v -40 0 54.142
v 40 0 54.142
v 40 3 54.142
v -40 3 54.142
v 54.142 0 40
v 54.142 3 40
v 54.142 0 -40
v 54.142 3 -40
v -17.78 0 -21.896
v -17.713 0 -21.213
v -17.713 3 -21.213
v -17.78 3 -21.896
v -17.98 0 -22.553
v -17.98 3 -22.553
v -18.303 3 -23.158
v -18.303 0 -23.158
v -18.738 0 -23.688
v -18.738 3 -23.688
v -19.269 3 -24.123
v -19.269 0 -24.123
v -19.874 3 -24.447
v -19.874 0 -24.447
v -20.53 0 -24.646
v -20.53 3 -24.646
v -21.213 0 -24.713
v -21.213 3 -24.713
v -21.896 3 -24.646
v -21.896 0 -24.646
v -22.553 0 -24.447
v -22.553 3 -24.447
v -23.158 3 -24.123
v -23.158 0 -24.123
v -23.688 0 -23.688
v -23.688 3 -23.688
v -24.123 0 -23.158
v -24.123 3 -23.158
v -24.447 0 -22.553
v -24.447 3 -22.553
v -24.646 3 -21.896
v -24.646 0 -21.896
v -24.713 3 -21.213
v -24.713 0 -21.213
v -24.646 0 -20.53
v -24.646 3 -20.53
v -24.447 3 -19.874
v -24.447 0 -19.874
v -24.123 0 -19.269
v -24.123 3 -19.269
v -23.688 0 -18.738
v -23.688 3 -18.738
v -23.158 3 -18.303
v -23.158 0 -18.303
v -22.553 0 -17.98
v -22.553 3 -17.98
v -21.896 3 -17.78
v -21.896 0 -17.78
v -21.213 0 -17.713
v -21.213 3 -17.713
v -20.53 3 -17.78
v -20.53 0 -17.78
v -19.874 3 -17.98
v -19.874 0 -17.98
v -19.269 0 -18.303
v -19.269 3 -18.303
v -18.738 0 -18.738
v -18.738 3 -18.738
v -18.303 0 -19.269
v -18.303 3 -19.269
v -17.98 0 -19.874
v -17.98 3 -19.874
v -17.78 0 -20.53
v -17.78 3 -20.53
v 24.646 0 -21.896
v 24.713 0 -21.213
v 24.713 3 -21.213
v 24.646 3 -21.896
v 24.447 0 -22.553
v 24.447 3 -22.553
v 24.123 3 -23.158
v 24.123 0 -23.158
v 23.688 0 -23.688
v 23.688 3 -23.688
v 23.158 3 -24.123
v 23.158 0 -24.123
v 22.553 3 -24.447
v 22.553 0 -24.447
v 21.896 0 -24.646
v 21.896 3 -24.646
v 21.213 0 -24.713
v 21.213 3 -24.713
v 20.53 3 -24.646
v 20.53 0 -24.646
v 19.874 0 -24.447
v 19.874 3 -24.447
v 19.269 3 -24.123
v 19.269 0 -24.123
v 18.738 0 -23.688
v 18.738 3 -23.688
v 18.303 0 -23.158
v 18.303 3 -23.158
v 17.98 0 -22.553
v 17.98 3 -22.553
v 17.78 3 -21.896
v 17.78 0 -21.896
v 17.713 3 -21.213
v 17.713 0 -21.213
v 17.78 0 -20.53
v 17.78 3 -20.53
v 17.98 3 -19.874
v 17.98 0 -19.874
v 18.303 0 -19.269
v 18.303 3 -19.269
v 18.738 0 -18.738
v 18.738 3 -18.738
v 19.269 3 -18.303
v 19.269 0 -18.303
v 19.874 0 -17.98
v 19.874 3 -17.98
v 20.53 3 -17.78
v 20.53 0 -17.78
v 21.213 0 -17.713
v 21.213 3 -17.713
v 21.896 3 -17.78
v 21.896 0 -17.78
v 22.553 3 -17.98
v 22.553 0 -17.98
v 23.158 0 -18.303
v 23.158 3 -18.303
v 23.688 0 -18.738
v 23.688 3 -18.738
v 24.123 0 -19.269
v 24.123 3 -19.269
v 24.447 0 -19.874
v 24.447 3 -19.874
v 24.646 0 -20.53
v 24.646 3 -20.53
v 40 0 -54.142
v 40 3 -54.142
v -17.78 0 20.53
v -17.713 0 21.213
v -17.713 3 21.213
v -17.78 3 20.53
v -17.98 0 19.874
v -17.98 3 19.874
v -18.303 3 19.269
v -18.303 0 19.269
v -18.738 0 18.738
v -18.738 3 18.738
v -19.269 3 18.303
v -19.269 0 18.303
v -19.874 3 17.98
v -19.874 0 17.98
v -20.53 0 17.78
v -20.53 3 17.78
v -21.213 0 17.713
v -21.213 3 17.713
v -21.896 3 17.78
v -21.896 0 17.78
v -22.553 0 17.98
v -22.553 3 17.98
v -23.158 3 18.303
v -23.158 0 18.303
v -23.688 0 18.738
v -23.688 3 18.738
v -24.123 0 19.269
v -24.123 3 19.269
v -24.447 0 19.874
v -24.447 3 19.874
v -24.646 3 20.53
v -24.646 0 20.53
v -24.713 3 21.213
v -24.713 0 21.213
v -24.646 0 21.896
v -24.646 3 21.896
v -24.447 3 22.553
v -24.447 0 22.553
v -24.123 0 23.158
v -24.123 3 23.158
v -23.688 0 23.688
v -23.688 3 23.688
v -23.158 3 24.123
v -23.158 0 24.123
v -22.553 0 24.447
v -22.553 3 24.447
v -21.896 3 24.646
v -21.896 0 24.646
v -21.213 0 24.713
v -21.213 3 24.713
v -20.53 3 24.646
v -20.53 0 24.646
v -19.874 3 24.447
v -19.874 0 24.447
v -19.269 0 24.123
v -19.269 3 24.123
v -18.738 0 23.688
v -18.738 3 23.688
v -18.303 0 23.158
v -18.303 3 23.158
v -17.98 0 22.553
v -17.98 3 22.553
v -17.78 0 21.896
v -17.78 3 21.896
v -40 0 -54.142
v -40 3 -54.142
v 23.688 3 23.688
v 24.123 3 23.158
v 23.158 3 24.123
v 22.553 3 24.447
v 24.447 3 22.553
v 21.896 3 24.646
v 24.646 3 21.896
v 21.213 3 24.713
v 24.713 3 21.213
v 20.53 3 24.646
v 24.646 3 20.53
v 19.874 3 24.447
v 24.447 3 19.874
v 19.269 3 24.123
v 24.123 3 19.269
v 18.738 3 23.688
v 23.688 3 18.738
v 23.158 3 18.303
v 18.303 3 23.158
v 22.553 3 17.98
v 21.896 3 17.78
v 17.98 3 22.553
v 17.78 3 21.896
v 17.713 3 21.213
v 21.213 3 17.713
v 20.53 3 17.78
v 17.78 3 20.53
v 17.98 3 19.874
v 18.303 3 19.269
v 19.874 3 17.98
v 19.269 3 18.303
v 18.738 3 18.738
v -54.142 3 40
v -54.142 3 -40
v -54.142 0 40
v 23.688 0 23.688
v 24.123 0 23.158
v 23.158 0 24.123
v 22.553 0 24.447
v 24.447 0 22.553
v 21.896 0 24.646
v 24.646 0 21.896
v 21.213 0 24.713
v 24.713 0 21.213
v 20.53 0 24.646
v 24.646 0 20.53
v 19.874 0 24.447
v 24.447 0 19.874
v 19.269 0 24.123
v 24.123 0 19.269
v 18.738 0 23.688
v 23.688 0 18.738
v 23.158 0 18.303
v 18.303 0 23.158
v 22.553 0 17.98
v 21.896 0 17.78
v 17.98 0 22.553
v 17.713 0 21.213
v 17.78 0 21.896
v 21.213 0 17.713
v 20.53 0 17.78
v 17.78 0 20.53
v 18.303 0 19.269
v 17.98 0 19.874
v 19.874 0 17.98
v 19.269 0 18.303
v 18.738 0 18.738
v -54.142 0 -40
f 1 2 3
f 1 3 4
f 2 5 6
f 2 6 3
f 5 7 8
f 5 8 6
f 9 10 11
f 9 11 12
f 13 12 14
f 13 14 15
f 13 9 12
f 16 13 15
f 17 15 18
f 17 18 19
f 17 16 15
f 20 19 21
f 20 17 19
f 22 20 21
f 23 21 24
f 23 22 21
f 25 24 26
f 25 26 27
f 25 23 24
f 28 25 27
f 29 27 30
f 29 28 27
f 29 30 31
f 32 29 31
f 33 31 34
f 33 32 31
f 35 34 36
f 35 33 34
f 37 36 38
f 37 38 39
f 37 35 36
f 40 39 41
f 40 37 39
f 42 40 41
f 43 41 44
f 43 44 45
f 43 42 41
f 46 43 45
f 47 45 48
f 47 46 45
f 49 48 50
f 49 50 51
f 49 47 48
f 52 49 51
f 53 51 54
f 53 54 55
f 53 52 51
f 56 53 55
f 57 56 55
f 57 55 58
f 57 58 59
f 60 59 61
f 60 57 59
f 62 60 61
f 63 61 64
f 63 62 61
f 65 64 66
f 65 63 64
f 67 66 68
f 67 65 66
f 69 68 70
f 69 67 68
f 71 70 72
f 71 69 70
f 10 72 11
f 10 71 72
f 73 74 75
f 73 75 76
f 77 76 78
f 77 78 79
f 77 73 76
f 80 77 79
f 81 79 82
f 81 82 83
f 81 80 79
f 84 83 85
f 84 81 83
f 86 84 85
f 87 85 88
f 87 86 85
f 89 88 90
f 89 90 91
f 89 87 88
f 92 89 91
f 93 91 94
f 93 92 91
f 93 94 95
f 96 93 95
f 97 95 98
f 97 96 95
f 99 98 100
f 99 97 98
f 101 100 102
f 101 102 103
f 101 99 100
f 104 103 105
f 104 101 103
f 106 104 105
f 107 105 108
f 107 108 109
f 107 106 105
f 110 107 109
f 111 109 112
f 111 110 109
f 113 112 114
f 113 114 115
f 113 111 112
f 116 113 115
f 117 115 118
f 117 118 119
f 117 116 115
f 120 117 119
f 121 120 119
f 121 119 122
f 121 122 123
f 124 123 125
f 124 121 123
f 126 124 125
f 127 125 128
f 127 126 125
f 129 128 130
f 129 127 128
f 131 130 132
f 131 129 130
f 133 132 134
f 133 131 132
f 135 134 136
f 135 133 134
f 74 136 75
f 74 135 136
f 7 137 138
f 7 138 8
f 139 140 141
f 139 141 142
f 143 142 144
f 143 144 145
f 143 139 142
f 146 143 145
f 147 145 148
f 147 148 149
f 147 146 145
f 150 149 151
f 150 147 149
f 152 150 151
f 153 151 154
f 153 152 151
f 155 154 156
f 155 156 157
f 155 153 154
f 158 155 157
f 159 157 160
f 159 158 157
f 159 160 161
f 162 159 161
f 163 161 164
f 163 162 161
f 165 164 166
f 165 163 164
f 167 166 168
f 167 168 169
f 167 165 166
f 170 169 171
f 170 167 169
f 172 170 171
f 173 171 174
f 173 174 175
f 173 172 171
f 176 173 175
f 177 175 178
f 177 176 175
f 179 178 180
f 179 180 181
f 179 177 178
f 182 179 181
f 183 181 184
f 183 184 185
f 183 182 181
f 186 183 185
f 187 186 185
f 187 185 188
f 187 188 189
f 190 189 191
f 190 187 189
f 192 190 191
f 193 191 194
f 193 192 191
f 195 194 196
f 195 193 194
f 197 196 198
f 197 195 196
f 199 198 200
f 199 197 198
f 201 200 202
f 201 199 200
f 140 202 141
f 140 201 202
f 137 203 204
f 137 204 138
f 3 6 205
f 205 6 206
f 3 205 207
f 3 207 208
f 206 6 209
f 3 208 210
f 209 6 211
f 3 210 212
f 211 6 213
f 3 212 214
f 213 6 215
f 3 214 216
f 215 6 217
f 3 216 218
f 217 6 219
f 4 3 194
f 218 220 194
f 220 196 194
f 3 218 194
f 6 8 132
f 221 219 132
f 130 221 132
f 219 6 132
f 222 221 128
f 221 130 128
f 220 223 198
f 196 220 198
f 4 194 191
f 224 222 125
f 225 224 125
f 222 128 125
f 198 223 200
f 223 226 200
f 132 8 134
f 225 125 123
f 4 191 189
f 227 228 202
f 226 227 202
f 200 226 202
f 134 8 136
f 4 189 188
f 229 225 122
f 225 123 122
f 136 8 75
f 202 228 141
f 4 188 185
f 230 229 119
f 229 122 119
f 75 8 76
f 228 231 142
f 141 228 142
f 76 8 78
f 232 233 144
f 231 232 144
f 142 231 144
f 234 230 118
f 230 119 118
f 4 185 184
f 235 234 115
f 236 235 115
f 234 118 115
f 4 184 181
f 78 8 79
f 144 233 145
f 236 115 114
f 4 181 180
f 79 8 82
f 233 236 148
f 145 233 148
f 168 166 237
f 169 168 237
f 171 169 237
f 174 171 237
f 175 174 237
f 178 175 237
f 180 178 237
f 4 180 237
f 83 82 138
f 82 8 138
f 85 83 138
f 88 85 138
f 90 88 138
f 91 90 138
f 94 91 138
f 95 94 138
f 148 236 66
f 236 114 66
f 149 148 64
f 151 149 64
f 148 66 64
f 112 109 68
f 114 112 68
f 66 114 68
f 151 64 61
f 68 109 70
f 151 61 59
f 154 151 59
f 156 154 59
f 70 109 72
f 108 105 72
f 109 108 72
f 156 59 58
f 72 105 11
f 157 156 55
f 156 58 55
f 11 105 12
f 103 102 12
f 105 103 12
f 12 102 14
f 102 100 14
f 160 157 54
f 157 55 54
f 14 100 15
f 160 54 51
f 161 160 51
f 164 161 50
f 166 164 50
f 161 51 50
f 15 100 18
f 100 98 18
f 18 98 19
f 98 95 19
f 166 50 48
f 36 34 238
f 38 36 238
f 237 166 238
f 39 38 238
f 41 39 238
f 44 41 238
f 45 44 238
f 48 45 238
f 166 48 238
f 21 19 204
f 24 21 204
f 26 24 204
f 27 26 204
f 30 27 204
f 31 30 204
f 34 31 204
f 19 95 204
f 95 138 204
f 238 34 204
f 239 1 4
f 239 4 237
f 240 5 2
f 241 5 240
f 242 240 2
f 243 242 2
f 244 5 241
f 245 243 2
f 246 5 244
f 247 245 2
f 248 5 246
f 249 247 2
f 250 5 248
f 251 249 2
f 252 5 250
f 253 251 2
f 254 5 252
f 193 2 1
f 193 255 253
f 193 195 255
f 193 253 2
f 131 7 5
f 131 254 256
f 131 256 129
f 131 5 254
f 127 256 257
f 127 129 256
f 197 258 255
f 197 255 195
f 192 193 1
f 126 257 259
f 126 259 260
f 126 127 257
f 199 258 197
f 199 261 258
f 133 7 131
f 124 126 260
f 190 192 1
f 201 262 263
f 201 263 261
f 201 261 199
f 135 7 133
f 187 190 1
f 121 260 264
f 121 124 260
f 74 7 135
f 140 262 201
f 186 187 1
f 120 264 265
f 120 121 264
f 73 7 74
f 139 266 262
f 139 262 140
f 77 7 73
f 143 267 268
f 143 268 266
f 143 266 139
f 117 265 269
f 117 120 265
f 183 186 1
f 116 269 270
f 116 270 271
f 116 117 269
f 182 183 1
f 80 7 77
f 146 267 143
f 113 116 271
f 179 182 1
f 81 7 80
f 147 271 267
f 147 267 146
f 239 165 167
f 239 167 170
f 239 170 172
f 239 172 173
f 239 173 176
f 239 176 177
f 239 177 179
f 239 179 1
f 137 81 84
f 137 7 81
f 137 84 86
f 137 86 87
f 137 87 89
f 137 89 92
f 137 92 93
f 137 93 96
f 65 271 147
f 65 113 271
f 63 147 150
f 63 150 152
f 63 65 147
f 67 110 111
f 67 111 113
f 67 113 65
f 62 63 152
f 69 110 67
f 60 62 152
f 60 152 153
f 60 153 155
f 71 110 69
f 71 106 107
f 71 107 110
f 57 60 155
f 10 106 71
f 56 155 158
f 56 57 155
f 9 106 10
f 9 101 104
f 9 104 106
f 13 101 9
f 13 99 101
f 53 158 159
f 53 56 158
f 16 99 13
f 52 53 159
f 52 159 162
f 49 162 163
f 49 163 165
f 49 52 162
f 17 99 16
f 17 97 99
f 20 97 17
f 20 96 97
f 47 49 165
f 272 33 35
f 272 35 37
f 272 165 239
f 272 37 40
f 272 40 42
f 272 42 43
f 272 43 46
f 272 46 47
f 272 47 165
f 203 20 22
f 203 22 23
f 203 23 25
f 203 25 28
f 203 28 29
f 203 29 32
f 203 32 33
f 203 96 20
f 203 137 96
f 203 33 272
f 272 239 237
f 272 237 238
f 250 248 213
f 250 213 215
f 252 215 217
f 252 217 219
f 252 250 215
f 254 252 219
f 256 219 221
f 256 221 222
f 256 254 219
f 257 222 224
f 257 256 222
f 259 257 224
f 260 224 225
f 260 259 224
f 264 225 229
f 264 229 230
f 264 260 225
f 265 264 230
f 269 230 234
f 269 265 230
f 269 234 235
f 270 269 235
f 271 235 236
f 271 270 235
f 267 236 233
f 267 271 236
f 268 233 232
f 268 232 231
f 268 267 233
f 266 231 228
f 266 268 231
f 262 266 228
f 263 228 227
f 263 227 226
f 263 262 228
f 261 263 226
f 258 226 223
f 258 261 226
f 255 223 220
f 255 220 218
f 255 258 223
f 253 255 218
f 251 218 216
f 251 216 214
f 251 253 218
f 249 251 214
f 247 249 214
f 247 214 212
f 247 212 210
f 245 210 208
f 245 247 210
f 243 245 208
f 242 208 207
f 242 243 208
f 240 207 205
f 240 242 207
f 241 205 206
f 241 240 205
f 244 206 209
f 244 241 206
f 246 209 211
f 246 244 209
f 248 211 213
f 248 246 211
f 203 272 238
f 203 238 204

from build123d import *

# Parameters (mm, degrees)
SKETCH1_R           = 3.5
BOSS_EXTRUDE1_DEPTH = 3


with BuildPart() as part:
    # Sketch1 → Boss-Extrude1 (new body)
    with BuildSketch(Plane(origin=(0, 0, 0), x_dir=(1, 0, 0), z_dir=(0, 1, 0))):
        Polygon((-54.142135624, 40), (-40, 54.142135624), (40, 54.142135624), (54.142135624, 40), (54.142135624, -40), (40, -54.142135624), (-40, -54.142135624), (-54.142135624, -40), align=None)
        with Locations((-21.213203436, 21.213203436)):
            Circle(SKETCH1_R, mode=Mode.SUBTRACT)
        with Locations((21.213203436, 21.213203436)):
            Circle(SKETCH1_R, mode=Mode.SUBTRACT)
        with Locations((21.213203436, -21.213203436)):
            Circle(SKETCH1_R, mode=Mode.SUBTRACT)
        with Locations((-21.213203436, -21.213203436)):
            Circle(SKETCH1_R, mode=Mode.SUBTRACT)
    extrude(amount=BOSS_EXTRUDE1_DEPTH)


solid = part.part
